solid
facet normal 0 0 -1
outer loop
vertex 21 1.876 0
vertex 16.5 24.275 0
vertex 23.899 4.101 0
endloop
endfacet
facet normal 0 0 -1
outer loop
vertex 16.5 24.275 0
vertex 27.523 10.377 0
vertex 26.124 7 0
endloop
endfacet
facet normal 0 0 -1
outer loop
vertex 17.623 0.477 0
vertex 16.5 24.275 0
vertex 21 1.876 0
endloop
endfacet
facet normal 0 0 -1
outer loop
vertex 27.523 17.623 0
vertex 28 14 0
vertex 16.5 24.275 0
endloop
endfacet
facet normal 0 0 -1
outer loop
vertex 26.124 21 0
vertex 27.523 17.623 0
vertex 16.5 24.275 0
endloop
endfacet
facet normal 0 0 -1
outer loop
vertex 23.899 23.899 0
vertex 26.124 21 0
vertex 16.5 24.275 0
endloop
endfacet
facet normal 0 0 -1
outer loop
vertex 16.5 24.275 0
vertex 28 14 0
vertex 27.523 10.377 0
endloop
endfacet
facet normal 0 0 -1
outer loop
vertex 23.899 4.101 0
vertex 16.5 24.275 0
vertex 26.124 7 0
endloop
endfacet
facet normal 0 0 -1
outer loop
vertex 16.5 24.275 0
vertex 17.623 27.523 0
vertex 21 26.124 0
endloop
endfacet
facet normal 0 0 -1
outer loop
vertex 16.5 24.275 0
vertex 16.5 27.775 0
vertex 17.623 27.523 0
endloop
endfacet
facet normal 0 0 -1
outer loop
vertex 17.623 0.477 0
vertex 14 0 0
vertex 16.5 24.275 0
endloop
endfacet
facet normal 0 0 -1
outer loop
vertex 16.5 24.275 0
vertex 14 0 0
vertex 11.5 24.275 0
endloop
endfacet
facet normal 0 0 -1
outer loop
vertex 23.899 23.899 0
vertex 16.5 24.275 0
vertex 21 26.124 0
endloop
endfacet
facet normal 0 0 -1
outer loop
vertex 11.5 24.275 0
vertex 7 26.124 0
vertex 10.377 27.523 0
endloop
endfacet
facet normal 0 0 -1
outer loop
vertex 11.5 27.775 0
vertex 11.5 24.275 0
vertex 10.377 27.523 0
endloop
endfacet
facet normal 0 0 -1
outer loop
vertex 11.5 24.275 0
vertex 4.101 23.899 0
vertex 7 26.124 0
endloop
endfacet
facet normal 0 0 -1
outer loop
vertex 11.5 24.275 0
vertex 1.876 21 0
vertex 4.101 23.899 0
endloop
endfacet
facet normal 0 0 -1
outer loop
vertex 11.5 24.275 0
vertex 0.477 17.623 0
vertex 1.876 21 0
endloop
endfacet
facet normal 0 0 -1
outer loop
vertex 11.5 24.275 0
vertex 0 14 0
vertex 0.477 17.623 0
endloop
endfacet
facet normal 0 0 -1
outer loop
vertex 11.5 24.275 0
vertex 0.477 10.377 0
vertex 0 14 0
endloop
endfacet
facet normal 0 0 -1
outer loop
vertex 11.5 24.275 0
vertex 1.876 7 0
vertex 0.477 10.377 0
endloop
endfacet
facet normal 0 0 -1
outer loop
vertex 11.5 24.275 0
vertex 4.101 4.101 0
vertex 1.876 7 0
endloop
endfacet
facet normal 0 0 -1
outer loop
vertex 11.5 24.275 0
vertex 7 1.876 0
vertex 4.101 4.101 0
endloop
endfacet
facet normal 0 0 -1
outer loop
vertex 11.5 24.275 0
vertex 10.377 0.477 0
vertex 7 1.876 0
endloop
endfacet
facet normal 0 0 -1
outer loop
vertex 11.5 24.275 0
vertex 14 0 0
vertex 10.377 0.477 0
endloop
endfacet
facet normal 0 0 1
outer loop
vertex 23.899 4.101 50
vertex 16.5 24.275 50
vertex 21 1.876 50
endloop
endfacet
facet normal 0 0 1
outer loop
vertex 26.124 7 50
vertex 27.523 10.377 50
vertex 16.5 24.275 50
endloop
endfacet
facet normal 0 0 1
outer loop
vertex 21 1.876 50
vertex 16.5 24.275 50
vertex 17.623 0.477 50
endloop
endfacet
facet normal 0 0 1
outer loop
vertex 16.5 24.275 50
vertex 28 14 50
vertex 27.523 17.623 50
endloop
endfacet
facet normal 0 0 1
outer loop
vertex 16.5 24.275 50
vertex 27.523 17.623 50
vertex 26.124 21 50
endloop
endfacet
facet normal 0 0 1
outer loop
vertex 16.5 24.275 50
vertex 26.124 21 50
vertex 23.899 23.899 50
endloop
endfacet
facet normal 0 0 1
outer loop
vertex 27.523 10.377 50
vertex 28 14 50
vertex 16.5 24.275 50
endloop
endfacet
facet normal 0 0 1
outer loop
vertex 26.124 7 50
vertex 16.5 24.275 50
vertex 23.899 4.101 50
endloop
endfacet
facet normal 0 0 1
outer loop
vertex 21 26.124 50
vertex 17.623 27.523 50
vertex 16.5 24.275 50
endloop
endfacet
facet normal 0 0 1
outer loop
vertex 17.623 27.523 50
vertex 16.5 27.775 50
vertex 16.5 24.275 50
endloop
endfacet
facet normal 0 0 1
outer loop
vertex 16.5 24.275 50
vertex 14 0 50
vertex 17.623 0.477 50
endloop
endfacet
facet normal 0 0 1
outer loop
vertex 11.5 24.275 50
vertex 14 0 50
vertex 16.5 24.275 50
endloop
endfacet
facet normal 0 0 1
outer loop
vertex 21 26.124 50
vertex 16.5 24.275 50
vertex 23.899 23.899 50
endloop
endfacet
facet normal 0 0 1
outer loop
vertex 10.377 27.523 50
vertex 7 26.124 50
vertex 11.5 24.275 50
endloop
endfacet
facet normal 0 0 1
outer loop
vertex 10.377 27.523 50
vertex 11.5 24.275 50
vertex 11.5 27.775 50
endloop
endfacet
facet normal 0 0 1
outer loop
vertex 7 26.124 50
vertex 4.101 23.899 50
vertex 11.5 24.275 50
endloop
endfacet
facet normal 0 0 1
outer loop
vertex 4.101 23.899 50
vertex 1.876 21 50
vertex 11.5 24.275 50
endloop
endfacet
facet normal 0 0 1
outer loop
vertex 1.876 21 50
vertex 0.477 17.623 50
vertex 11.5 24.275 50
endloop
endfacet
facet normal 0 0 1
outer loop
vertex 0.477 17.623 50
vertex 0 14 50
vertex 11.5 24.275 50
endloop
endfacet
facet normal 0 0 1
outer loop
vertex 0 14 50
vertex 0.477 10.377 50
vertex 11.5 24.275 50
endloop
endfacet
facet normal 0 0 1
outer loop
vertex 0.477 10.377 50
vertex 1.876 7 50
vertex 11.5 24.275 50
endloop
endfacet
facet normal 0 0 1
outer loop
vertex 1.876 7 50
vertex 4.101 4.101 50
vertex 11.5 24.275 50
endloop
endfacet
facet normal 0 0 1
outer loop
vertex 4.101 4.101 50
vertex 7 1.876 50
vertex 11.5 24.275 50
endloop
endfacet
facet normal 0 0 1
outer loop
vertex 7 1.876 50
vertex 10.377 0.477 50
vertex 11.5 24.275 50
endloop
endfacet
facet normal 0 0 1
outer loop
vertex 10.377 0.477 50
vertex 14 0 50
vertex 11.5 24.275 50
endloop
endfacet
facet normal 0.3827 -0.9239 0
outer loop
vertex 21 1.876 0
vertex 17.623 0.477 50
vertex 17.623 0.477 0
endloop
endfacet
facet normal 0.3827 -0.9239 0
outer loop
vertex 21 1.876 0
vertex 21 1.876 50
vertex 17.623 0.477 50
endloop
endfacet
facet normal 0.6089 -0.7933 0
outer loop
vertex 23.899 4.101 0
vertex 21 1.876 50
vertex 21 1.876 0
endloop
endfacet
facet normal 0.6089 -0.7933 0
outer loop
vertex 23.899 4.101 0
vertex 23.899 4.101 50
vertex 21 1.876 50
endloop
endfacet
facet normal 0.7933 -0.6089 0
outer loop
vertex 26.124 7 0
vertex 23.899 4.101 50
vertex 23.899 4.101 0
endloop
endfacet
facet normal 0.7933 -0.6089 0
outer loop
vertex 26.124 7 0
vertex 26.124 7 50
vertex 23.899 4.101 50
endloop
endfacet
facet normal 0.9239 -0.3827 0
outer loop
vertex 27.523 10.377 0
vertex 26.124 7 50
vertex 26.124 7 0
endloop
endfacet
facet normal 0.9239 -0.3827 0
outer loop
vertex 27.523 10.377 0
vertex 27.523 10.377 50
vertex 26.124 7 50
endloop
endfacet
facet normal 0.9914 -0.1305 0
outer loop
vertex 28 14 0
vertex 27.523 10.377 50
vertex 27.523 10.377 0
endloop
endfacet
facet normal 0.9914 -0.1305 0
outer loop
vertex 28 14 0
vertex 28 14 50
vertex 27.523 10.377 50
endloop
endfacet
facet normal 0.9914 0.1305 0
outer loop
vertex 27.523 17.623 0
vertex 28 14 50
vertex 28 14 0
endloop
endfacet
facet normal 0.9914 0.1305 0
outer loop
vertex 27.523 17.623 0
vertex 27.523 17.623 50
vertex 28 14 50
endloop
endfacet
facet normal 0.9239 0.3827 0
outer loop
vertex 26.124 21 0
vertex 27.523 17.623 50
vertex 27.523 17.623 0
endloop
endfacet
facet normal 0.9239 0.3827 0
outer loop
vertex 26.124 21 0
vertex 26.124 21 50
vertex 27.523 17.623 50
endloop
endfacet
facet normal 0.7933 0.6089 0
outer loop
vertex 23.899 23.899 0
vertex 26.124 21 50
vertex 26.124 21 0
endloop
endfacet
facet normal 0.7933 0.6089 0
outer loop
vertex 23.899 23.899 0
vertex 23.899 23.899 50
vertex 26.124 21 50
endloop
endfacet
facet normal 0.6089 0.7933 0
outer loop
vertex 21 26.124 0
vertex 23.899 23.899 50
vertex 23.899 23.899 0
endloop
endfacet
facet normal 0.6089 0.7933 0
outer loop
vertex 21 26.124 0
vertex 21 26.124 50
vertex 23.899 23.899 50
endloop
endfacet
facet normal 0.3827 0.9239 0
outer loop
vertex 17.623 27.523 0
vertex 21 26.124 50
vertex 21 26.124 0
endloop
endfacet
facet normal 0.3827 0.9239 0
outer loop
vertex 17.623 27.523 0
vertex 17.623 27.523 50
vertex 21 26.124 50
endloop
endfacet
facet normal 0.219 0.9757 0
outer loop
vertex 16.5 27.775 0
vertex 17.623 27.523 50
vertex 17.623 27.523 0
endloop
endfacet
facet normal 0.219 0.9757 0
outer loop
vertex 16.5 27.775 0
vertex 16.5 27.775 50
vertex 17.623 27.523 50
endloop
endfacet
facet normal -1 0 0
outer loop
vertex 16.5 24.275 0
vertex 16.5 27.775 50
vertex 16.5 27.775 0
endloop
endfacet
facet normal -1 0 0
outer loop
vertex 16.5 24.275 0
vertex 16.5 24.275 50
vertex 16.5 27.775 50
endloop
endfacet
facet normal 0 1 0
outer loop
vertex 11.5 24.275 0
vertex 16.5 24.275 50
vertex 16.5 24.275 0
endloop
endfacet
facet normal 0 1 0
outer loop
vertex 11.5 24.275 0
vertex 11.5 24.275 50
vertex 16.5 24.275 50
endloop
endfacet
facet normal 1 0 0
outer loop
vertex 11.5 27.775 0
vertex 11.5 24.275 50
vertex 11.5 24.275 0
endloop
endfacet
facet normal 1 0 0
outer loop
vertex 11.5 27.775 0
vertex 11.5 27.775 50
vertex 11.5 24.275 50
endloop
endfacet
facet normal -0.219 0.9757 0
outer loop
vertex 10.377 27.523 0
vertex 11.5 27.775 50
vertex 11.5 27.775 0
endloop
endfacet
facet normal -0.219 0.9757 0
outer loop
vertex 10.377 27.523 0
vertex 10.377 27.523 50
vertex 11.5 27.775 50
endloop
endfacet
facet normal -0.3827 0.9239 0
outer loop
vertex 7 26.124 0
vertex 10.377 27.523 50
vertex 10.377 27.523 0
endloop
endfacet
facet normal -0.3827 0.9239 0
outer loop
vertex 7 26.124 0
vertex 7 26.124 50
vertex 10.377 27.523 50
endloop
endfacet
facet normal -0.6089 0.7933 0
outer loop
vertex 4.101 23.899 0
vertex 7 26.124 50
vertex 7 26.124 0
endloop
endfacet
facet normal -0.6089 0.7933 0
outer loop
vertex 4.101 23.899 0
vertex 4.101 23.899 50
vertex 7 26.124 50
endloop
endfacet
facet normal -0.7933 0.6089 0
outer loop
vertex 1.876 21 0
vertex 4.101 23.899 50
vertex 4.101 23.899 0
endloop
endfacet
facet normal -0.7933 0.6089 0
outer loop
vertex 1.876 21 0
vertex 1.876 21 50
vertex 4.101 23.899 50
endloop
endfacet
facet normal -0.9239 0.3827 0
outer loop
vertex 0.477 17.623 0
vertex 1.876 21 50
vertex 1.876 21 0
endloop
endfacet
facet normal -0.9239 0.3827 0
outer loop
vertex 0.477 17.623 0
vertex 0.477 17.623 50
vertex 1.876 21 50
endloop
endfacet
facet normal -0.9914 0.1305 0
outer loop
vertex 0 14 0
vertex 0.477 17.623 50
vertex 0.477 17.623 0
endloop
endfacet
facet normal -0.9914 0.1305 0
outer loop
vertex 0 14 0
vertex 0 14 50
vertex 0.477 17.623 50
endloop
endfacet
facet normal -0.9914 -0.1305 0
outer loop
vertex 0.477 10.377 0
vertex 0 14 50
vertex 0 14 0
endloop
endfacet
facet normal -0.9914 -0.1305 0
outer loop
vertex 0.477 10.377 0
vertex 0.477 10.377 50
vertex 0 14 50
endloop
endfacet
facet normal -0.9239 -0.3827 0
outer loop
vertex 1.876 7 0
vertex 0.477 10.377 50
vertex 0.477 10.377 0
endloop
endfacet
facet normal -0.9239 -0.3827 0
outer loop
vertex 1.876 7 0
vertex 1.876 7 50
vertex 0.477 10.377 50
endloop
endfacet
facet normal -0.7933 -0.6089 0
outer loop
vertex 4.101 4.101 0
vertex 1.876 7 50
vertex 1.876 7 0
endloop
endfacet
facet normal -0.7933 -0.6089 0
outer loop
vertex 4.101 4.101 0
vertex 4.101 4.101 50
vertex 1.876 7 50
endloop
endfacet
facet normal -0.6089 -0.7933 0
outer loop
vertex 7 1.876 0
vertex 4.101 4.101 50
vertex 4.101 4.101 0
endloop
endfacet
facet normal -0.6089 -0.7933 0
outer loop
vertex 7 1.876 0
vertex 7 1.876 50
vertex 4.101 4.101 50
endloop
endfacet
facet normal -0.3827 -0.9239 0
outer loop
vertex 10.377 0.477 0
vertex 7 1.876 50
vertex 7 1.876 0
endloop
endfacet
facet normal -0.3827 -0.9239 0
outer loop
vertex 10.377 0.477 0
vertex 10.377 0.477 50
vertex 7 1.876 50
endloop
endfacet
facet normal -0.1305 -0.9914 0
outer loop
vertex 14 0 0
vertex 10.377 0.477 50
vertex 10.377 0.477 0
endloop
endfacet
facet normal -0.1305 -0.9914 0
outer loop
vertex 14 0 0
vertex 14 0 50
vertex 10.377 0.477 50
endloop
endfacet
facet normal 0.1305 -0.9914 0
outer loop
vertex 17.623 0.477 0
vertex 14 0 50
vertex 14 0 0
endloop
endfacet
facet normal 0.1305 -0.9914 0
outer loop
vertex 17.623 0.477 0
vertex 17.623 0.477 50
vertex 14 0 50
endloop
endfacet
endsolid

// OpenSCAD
$fn = 32;

// ----------------------------------------------------------------------
// Keyway shaft: d28 shaft, key 5 x 3.5 mm
// ----------------------------------------------------------------------

// --- parameters (mm) ---
shaft_r = 14;             // shaft radius
key_w = 5;                // keyway width
key_d = 3.5;              // keyway depth below the surface line
plate_t = 50;             // shaft length, Z (extrusion height)
fit_tol = 0.05;           // declared fit tolerance (prompt contract)
free_tol = 0.2;           // declared free tolerance (prompt contract)

shaft_d = 2 * shaft_r;  // shaft diameter
circle_step = 15;  // polygon sampling step, degrees

profile = [[10.377, 27.523], [7, 26.124], [4.101, 23.899], [1.876, 21], [0.477, 17.623], [0, 14], [0.477, 10.377], [1.876, 7], [4.101, 4.101], [7, 1.876], [10.377, 0.477], [14, 0], [17.623, 0.477], [21, 1.876], [23.899, 4.101], [26.124, 7], [27.523, 10.377], [28, 14], [27.523, 17.623], [26.124, 21], [23.899, 23.899], [21, 26.124], [17.623, 27.523], [16.5, 27.775], [16.5, 24.275], [11.5, 24.275], [11.5, 27.775]];  // primary outline, 27 points, counter clockwise

// --- the one profile operation ---
linear_extrude(height = plate_t) polygon(points = profile);
